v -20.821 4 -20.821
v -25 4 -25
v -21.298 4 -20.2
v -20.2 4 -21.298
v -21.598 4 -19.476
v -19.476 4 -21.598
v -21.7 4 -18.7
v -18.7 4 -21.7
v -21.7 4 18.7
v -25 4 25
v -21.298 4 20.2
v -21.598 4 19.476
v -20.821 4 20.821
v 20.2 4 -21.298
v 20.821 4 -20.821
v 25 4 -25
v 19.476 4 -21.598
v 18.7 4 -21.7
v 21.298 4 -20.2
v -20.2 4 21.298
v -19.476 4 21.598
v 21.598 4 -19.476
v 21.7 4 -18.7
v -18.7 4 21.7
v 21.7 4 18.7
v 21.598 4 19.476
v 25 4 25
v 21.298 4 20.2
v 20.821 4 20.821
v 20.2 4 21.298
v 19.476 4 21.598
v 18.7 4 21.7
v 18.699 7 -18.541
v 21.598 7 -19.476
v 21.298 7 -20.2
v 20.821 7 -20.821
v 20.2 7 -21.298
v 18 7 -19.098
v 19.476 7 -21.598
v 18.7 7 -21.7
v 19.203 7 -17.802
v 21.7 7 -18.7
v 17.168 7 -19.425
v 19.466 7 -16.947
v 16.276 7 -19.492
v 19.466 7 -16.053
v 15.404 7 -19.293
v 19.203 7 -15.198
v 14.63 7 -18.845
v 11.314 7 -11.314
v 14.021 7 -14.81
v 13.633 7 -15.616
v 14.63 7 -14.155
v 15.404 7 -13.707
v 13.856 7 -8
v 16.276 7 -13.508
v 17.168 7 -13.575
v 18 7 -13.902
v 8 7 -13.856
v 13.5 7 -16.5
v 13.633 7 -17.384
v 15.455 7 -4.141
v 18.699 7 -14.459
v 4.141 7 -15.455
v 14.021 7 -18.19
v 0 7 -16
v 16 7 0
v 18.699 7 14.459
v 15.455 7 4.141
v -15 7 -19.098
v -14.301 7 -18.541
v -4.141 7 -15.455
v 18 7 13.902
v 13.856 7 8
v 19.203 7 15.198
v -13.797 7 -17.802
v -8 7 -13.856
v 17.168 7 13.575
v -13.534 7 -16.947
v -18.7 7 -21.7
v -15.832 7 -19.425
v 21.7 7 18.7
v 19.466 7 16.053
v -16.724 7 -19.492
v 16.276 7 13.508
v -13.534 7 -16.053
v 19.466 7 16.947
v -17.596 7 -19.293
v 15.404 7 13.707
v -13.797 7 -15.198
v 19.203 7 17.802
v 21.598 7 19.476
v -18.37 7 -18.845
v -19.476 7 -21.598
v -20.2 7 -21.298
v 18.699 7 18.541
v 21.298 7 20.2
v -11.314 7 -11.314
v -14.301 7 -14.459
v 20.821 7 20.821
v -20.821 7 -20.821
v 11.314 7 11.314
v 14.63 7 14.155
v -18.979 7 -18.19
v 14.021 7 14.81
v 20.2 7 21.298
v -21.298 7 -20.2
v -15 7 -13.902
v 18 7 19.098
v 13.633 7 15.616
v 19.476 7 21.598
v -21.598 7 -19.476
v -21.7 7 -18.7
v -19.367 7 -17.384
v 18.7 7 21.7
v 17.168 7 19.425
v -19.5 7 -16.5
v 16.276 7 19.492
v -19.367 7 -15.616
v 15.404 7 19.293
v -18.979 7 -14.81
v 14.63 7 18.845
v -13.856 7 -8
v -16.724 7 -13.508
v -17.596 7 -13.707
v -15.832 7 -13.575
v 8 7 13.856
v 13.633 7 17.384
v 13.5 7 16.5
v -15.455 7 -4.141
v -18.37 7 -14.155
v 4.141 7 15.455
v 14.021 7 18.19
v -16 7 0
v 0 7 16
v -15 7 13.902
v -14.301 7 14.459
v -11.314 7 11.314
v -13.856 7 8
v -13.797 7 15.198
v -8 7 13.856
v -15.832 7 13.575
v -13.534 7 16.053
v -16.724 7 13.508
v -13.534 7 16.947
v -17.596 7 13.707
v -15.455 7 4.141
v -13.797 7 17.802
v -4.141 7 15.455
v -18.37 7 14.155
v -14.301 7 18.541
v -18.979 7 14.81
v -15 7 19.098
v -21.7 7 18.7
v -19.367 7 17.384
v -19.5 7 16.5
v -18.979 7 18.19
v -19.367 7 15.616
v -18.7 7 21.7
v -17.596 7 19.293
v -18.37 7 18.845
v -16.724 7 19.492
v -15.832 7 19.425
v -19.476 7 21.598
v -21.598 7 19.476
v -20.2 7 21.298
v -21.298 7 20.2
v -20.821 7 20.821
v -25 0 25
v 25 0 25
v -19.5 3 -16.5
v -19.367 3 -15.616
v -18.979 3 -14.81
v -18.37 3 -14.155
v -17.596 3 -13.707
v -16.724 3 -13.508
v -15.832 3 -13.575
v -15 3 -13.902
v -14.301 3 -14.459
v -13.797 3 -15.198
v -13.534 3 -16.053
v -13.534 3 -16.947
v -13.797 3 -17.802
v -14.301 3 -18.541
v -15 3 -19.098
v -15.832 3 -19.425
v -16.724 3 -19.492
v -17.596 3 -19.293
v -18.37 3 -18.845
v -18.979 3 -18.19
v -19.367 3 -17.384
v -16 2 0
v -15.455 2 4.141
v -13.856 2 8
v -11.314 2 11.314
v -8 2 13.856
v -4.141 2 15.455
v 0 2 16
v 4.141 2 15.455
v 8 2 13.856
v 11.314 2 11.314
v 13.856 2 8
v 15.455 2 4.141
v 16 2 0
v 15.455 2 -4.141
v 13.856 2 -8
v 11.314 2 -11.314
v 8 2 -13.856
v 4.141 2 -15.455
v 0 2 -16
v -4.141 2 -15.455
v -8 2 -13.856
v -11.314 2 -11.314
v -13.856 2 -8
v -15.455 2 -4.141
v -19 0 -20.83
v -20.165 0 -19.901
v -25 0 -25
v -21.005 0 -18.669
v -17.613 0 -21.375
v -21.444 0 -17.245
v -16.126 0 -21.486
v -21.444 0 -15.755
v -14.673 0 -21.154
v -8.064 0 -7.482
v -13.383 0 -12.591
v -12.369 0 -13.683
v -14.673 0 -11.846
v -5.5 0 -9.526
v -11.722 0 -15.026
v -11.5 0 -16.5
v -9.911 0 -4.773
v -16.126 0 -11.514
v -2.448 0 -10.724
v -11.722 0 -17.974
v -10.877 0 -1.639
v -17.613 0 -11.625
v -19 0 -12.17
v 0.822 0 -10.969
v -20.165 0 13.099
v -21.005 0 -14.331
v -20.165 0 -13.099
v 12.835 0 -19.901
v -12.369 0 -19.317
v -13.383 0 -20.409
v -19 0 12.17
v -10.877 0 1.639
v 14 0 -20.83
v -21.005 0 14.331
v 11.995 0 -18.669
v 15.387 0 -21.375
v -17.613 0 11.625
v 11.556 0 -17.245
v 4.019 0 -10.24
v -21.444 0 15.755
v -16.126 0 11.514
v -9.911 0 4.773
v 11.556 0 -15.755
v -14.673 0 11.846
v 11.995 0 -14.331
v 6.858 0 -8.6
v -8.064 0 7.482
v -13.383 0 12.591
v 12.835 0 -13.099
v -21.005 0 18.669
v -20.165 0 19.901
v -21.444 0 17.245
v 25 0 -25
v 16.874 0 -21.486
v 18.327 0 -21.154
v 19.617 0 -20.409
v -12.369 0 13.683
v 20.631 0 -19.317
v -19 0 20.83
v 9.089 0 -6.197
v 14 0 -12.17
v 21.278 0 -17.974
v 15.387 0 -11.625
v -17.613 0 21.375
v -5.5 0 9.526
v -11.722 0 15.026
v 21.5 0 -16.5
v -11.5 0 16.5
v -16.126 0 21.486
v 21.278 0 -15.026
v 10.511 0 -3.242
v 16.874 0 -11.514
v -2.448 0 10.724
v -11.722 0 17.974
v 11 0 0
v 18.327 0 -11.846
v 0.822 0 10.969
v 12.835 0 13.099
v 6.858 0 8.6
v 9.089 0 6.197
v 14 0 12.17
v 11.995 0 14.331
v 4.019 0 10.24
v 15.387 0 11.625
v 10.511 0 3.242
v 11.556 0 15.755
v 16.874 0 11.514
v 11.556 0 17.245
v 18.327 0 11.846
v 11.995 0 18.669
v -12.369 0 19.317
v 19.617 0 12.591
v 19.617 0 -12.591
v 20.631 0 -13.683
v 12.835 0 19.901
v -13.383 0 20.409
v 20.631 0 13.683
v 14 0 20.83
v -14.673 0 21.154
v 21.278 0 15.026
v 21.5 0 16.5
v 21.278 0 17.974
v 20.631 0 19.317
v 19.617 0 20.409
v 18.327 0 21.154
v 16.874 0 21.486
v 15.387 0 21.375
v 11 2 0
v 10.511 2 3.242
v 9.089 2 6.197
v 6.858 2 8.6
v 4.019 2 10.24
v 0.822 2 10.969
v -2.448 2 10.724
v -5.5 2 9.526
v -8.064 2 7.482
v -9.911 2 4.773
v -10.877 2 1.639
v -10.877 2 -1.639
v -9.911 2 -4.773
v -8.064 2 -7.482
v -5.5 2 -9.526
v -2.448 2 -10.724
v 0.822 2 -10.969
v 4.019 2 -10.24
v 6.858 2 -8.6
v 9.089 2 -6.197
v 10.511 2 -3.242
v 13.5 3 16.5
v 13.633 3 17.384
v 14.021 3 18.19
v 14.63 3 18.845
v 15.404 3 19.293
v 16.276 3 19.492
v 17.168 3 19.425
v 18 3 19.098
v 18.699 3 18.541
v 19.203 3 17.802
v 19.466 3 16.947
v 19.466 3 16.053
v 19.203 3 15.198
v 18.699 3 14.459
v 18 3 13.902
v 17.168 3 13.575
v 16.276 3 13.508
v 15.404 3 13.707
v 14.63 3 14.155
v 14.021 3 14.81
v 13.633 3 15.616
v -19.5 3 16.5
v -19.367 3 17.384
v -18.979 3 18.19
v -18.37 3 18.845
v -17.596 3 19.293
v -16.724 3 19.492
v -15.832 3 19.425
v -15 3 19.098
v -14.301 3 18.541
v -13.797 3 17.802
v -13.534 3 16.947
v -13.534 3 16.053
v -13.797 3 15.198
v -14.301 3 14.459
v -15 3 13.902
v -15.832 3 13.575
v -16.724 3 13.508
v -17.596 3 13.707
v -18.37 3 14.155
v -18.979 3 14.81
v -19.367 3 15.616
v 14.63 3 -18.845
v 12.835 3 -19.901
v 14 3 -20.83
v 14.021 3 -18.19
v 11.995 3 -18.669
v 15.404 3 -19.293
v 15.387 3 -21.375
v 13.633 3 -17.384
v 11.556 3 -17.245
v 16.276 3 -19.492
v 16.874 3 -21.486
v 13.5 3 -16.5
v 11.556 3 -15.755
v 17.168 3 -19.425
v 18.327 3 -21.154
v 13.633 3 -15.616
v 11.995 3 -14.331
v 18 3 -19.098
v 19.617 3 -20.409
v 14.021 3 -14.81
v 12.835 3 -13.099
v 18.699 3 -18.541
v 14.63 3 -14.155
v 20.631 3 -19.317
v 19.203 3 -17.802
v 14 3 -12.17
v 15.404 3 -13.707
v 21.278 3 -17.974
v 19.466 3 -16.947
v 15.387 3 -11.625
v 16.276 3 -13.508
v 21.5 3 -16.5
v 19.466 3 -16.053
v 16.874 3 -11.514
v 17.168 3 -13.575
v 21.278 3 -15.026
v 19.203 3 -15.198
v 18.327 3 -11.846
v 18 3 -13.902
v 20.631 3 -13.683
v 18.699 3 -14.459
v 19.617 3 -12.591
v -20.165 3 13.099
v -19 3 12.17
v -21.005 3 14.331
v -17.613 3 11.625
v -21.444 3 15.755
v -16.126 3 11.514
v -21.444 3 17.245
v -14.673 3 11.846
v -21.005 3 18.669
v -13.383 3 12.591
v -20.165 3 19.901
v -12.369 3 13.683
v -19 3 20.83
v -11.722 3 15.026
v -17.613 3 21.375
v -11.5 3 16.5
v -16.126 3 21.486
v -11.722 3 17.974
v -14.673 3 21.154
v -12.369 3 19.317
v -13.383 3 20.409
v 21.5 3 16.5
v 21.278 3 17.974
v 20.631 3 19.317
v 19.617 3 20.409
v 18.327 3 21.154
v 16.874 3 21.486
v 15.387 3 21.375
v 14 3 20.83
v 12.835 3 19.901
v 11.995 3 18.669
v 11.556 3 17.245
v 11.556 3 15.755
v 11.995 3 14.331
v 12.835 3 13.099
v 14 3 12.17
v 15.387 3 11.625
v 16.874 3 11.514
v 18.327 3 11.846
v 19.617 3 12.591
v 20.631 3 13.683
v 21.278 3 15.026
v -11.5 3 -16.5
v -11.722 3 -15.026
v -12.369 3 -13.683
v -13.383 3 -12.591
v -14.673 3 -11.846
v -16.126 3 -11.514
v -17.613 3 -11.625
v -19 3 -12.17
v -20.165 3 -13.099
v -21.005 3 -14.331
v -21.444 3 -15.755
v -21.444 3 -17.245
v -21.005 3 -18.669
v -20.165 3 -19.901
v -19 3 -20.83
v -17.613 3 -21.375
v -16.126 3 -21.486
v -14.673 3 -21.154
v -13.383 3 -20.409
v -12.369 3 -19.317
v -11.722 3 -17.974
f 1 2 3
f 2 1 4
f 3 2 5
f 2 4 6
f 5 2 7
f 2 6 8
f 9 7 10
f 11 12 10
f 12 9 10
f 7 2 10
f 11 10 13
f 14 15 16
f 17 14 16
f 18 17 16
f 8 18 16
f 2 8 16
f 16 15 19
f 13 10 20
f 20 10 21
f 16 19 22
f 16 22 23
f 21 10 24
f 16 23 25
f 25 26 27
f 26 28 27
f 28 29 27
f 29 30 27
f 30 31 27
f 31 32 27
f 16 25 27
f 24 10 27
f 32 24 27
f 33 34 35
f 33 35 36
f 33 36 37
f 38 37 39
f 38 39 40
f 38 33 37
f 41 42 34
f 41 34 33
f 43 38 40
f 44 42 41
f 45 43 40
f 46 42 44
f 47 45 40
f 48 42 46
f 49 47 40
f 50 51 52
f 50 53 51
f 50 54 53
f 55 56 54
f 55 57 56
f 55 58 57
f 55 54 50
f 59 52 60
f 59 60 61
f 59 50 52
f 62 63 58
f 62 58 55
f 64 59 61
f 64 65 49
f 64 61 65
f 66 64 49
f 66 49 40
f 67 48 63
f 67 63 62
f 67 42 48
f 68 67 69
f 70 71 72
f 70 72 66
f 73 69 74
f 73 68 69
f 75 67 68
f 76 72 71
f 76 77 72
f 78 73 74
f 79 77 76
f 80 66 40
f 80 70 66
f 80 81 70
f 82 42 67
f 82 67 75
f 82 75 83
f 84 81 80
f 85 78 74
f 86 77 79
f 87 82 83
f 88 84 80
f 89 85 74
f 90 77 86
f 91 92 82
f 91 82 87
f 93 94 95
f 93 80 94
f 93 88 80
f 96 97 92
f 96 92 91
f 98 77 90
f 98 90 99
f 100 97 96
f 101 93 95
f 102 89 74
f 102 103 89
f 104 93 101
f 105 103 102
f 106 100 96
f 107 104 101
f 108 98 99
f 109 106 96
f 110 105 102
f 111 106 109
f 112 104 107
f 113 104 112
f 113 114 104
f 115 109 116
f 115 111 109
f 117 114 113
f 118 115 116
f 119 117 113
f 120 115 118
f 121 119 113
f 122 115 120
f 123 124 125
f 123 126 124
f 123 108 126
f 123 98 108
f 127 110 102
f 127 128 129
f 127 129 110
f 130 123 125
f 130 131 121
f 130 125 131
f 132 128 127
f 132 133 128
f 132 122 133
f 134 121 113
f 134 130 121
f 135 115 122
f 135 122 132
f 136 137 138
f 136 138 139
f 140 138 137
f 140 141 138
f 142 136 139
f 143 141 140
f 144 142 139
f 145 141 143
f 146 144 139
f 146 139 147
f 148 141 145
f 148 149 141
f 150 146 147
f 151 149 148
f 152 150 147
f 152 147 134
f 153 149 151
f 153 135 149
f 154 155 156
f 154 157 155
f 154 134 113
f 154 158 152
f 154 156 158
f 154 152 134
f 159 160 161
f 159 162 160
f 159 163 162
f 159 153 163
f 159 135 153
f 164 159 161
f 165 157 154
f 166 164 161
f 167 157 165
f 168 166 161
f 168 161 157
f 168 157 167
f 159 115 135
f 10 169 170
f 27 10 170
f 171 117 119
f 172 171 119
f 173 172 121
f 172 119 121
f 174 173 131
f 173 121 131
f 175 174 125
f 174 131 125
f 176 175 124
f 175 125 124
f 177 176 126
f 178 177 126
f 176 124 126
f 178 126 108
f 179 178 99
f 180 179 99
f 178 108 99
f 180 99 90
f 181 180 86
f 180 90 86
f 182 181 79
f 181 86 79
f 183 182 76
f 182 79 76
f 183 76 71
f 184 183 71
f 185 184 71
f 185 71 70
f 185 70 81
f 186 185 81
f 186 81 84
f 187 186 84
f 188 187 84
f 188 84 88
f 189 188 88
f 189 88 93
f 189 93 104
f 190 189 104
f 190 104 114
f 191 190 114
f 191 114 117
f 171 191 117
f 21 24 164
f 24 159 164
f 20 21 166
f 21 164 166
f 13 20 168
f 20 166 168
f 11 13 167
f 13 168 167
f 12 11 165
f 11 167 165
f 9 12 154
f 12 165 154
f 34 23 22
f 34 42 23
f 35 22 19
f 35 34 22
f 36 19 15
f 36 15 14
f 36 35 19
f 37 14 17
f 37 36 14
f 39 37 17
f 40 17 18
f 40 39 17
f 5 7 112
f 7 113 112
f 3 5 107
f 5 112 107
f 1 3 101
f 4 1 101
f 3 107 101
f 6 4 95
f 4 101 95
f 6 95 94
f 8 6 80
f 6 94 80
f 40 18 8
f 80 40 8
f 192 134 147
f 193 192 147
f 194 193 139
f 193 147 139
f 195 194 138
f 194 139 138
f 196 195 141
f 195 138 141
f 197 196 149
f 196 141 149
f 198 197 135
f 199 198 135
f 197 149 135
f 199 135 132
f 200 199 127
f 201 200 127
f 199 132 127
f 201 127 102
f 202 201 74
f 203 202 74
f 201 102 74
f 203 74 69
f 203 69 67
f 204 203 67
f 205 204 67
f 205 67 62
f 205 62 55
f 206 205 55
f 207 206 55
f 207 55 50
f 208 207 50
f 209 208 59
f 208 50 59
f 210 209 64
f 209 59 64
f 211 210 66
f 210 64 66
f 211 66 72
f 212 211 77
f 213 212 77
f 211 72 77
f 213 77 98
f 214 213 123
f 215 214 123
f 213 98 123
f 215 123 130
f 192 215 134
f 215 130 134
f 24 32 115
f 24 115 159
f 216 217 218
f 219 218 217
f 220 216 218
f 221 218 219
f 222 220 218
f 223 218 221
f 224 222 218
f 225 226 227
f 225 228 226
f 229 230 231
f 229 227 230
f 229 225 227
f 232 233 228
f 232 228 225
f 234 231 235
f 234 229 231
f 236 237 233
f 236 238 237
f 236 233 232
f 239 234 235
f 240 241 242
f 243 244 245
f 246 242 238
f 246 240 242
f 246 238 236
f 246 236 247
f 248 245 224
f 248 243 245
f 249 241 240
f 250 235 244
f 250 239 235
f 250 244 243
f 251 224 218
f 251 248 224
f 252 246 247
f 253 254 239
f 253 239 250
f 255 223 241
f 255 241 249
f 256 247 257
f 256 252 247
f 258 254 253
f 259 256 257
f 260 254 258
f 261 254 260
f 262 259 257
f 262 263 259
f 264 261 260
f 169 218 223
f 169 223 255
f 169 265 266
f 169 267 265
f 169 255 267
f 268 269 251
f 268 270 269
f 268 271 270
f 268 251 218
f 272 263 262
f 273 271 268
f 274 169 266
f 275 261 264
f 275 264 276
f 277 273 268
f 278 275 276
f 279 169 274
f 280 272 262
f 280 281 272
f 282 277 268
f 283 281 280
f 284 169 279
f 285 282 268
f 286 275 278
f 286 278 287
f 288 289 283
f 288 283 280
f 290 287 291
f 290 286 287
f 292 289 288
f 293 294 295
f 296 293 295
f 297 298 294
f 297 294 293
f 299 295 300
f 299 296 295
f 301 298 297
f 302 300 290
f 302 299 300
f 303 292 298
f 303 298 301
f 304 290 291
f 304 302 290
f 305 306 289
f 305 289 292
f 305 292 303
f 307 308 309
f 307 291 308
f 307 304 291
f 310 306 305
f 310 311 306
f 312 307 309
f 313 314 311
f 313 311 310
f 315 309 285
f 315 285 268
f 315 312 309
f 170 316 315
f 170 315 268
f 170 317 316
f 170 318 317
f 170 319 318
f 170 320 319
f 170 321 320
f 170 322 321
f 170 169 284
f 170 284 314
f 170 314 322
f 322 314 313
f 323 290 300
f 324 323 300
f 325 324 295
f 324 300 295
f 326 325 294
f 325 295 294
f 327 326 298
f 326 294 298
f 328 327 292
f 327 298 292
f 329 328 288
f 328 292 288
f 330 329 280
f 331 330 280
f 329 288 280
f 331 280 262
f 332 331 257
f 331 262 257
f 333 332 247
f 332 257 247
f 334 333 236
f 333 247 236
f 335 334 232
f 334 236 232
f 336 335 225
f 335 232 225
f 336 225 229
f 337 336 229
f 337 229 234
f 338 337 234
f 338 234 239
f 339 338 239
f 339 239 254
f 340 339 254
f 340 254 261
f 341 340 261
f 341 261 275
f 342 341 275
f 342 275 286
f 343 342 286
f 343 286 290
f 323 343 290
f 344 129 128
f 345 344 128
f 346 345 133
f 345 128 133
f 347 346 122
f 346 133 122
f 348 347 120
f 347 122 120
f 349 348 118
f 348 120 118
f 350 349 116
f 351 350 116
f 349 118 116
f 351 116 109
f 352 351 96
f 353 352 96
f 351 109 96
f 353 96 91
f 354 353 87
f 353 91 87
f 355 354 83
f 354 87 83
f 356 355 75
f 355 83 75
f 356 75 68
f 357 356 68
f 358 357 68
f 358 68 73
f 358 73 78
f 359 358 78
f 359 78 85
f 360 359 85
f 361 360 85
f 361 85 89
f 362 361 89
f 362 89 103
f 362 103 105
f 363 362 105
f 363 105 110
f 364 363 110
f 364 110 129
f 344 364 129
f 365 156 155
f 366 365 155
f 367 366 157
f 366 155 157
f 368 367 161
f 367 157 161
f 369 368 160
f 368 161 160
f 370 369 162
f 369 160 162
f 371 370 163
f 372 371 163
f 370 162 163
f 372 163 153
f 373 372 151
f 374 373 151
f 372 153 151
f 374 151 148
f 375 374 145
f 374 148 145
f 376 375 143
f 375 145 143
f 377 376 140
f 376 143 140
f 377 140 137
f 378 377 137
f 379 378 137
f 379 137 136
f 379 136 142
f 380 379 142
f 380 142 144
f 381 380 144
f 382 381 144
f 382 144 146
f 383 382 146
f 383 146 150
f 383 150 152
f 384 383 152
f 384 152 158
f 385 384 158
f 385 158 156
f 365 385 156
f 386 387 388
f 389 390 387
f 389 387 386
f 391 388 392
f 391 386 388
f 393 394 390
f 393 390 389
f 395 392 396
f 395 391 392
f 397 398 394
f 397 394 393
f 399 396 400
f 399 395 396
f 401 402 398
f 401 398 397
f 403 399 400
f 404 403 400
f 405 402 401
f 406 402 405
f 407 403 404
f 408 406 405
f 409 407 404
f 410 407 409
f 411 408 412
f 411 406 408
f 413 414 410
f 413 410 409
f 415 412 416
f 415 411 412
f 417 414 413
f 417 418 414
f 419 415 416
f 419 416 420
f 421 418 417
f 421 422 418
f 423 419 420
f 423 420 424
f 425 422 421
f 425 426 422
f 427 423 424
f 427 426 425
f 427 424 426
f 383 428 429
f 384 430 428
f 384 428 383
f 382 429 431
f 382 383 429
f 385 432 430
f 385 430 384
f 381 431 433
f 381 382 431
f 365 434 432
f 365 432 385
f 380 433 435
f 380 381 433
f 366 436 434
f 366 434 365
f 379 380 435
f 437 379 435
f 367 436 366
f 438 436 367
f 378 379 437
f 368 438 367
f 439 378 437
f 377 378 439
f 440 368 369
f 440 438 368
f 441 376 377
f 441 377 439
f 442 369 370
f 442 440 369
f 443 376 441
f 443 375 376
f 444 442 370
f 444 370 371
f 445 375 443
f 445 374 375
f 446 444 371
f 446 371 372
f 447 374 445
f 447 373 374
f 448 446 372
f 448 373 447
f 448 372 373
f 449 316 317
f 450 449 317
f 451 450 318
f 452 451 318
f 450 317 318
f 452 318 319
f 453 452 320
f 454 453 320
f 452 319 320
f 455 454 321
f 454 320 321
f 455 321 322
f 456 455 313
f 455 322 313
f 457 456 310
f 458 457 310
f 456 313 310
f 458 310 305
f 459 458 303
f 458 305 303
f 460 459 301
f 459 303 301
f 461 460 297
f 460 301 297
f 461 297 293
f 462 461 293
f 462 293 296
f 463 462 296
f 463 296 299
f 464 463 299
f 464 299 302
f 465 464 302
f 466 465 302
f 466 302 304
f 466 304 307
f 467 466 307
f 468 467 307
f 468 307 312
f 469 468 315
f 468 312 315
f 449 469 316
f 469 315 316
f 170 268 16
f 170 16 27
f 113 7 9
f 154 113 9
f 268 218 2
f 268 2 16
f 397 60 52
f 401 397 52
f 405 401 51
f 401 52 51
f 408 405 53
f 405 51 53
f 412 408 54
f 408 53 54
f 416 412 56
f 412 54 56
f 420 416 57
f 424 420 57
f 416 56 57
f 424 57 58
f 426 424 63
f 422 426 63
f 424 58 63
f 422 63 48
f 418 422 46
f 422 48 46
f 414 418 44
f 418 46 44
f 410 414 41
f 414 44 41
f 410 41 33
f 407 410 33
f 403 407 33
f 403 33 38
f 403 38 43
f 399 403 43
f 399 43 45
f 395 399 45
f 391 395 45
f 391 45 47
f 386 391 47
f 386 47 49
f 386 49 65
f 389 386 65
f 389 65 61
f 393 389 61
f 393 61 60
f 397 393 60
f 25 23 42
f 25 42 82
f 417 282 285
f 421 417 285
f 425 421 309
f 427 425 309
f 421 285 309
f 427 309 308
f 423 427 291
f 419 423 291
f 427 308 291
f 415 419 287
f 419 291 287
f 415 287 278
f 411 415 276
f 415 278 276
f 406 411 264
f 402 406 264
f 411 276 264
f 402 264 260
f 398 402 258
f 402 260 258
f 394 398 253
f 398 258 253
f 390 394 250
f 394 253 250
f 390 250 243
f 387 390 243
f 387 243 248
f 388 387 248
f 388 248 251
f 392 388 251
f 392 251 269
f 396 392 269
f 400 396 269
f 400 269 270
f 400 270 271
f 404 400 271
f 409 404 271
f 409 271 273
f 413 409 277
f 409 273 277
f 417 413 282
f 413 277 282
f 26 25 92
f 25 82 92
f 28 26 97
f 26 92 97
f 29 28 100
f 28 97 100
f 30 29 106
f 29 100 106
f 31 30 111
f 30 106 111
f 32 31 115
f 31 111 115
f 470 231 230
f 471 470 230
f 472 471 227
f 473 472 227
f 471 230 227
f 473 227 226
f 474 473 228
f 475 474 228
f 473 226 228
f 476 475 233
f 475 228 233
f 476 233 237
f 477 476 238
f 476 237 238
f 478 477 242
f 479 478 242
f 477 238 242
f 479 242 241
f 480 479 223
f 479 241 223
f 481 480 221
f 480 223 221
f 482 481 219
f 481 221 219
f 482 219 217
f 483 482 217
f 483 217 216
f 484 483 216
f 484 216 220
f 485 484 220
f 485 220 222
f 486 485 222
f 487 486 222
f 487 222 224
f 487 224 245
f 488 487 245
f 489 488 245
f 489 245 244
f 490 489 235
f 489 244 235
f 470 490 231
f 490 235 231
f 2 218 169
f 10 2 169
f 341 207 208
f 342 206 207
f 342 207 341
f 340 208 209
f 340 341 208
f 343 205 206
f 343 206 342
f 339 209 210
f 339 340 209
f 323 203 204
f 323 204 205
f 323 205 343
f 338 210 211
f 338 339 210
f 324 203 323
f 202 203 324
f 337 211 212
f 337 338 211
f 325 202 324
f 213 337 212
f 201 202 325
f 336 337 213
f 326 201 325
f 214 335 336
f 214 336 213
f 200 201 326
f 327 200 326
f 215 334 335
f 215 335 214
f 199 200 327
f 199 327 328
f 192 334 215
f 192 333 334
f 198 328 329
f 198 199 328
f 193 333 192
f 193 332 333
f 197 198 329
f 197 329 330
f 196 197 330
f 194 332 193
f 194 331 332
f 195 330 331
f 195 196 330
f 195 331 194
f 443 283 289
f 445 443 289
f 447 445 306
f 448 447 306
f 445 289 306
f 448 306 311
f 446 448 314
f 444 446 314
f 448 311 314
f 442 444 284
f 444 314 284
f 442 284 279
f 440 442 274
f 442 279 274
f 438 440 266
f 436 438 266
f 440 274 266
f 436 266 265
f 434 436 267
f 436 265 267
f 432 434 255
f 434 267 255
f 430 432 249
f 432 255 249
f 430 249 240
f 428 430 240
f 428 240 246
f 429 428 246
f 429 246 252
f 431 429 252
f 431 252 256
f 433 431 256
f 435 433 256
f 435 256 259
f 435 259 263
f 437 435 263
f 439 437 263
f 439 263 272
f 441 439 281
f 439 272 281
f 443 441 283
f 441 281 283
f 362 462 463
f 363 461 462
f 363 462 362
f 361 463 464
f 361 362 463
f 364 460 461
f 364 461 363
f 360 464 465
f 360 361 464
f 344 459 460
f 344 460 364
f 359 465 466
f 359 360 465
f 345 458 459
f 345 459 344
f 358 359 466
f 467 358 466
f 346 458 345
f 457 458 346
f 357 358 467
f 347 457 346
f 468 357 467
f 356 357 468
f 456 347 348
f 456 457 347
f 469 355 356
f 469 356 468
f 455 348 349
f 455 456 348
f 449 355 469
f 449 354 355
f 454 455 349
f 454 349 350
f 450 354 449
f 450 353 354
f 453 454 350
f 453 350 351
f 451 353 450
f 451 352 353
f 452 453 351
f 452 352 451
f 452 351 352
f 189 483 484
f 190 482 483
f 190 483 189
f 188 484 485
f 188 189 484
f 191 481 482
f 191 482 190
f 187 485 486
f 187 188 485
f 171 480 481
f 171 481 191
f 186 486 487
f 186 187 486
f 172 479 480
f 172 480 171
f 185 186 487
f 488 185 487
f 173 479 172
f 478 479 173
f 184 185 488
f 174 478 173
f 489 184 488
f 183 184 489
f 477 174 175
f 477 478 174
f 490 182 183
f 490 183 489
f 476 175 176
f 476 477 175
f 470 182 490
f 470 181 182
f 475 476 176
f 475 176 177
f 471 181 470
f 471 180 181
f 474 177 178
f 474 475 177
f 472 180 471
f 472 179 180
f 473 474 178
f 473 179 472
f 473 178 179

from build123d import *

# Parameters (mm, degrees)
F0_W      = 50
F0_H      = 50
F1_DEPTH  = 4
F2_W      = 43.4
F2_H      = 43.4
F3_DEPTH  = 3
F4_R      = 3
F5_DEPTH  = 25
F6_R      = 5
F6_R_2    = 3
F7_DEPTH  = 3
F8_R      = 16
F9_DEPTH  = 5
F10_R     = 11
F11_DEPTH = 25
F12_R     = 3


# Not quite as in the source:
# - a feature names something its author has since deleted; it is built from what else it names


with BuildPart() as f1:
    # F0 (on Front) → F1 (new body)
    with BuildSketch(Plane.XZ):
        Rectangle(F0_W, F0_H)
    extrude(amount=-F1_DEPTH)

    # F2 (on face) → F3 (join)
    with BuildSketch(Plane(origin=(0, 4, 0), x_dir=(-1, 0, 0), z_dir=(0, 1, 0))):
        Rectangle(F2_W, F2_H)
    extrude(amount=F3_DEPTH)

    # F4 (on face) → F5 (cut)
    with BuildSketch(Plane(origin=(0, 7, 0), x_dir=(-1, 0, 0), z_dir=(0, 1, 0))):
        with Locations((-16.5, 16.5)):
            Circle(F4_R)
        with Locations((16.5, 16.5)):
            Circle(F4_R)
        with Locations((16.5, -16.5)):
            Circle(F4_R)
        with Locations((-16.5, -16.5)):
            Circle(F4_R)
    extrude(amount=-F5_DEPTH, mode=Mode.SUBTRACT)

    # F6 (on face) → F7 (cut)
    with BuildSketch(Plane.XZ):
        with Locations((-16.5, 16.5)):
            Circle(F6_R)
        with Locations((-16.5, 16.5)):
            Circle(F6_R_2, mode=Mode.SUBTRACT)
        with Locations((16.5, 16.5)):
            Circle(F6_R)
        with Locations((16.5, 16.5)):
            Circle(F6_R_2, mode=Mode.SUBTRACT)
        with Locations((16.5, -16.5)):
            Circle(F6_R)
        with Locations((16.5, -16.5)):
            Circle(F6_R_2, mode=Mode.SUBTRACT)
        with Locations((-16.5, -16.5)):
            Circle(F6_R)
        with Locations((-16.5, -16.5)):
            Circle(F6_R_2, mode=Mode.SUBTRACT)
    extrude(amount=-F7_DEPTH, mode=Mode.SUBTRACT)

    # F8 (on face) → F9 (cut)
    with BuildSketch(Plane(origin=(0, 7, 0), x_dir=(-1, 0, 0), z_dir=(0, 1, 0))):
        Circle(F8_R)
    extrude(amount=-F9_DEPTH, mode=Mode.SUBTRACT)

    # F10 (on face) → F11 (cut)
    with BuildSketch(Plane.XZ):
        Circle(F10_R)
    extrude(amount=-F11_DEPTH, mode=Mode.SUBTRACT)

    # F12
    f12_edges = [f1.edges().sort_by_distance(p)[0] for p in [
        (21.7, 5.5, 21.7),
        (-21.7, 5.5, 21.7),
        (-21.7, 5.5, -21.7),
        (21.7, 5.5, -21.7),
    ]]
    fillet(f12_edges, radius=F12_R)


solid = f1.part
